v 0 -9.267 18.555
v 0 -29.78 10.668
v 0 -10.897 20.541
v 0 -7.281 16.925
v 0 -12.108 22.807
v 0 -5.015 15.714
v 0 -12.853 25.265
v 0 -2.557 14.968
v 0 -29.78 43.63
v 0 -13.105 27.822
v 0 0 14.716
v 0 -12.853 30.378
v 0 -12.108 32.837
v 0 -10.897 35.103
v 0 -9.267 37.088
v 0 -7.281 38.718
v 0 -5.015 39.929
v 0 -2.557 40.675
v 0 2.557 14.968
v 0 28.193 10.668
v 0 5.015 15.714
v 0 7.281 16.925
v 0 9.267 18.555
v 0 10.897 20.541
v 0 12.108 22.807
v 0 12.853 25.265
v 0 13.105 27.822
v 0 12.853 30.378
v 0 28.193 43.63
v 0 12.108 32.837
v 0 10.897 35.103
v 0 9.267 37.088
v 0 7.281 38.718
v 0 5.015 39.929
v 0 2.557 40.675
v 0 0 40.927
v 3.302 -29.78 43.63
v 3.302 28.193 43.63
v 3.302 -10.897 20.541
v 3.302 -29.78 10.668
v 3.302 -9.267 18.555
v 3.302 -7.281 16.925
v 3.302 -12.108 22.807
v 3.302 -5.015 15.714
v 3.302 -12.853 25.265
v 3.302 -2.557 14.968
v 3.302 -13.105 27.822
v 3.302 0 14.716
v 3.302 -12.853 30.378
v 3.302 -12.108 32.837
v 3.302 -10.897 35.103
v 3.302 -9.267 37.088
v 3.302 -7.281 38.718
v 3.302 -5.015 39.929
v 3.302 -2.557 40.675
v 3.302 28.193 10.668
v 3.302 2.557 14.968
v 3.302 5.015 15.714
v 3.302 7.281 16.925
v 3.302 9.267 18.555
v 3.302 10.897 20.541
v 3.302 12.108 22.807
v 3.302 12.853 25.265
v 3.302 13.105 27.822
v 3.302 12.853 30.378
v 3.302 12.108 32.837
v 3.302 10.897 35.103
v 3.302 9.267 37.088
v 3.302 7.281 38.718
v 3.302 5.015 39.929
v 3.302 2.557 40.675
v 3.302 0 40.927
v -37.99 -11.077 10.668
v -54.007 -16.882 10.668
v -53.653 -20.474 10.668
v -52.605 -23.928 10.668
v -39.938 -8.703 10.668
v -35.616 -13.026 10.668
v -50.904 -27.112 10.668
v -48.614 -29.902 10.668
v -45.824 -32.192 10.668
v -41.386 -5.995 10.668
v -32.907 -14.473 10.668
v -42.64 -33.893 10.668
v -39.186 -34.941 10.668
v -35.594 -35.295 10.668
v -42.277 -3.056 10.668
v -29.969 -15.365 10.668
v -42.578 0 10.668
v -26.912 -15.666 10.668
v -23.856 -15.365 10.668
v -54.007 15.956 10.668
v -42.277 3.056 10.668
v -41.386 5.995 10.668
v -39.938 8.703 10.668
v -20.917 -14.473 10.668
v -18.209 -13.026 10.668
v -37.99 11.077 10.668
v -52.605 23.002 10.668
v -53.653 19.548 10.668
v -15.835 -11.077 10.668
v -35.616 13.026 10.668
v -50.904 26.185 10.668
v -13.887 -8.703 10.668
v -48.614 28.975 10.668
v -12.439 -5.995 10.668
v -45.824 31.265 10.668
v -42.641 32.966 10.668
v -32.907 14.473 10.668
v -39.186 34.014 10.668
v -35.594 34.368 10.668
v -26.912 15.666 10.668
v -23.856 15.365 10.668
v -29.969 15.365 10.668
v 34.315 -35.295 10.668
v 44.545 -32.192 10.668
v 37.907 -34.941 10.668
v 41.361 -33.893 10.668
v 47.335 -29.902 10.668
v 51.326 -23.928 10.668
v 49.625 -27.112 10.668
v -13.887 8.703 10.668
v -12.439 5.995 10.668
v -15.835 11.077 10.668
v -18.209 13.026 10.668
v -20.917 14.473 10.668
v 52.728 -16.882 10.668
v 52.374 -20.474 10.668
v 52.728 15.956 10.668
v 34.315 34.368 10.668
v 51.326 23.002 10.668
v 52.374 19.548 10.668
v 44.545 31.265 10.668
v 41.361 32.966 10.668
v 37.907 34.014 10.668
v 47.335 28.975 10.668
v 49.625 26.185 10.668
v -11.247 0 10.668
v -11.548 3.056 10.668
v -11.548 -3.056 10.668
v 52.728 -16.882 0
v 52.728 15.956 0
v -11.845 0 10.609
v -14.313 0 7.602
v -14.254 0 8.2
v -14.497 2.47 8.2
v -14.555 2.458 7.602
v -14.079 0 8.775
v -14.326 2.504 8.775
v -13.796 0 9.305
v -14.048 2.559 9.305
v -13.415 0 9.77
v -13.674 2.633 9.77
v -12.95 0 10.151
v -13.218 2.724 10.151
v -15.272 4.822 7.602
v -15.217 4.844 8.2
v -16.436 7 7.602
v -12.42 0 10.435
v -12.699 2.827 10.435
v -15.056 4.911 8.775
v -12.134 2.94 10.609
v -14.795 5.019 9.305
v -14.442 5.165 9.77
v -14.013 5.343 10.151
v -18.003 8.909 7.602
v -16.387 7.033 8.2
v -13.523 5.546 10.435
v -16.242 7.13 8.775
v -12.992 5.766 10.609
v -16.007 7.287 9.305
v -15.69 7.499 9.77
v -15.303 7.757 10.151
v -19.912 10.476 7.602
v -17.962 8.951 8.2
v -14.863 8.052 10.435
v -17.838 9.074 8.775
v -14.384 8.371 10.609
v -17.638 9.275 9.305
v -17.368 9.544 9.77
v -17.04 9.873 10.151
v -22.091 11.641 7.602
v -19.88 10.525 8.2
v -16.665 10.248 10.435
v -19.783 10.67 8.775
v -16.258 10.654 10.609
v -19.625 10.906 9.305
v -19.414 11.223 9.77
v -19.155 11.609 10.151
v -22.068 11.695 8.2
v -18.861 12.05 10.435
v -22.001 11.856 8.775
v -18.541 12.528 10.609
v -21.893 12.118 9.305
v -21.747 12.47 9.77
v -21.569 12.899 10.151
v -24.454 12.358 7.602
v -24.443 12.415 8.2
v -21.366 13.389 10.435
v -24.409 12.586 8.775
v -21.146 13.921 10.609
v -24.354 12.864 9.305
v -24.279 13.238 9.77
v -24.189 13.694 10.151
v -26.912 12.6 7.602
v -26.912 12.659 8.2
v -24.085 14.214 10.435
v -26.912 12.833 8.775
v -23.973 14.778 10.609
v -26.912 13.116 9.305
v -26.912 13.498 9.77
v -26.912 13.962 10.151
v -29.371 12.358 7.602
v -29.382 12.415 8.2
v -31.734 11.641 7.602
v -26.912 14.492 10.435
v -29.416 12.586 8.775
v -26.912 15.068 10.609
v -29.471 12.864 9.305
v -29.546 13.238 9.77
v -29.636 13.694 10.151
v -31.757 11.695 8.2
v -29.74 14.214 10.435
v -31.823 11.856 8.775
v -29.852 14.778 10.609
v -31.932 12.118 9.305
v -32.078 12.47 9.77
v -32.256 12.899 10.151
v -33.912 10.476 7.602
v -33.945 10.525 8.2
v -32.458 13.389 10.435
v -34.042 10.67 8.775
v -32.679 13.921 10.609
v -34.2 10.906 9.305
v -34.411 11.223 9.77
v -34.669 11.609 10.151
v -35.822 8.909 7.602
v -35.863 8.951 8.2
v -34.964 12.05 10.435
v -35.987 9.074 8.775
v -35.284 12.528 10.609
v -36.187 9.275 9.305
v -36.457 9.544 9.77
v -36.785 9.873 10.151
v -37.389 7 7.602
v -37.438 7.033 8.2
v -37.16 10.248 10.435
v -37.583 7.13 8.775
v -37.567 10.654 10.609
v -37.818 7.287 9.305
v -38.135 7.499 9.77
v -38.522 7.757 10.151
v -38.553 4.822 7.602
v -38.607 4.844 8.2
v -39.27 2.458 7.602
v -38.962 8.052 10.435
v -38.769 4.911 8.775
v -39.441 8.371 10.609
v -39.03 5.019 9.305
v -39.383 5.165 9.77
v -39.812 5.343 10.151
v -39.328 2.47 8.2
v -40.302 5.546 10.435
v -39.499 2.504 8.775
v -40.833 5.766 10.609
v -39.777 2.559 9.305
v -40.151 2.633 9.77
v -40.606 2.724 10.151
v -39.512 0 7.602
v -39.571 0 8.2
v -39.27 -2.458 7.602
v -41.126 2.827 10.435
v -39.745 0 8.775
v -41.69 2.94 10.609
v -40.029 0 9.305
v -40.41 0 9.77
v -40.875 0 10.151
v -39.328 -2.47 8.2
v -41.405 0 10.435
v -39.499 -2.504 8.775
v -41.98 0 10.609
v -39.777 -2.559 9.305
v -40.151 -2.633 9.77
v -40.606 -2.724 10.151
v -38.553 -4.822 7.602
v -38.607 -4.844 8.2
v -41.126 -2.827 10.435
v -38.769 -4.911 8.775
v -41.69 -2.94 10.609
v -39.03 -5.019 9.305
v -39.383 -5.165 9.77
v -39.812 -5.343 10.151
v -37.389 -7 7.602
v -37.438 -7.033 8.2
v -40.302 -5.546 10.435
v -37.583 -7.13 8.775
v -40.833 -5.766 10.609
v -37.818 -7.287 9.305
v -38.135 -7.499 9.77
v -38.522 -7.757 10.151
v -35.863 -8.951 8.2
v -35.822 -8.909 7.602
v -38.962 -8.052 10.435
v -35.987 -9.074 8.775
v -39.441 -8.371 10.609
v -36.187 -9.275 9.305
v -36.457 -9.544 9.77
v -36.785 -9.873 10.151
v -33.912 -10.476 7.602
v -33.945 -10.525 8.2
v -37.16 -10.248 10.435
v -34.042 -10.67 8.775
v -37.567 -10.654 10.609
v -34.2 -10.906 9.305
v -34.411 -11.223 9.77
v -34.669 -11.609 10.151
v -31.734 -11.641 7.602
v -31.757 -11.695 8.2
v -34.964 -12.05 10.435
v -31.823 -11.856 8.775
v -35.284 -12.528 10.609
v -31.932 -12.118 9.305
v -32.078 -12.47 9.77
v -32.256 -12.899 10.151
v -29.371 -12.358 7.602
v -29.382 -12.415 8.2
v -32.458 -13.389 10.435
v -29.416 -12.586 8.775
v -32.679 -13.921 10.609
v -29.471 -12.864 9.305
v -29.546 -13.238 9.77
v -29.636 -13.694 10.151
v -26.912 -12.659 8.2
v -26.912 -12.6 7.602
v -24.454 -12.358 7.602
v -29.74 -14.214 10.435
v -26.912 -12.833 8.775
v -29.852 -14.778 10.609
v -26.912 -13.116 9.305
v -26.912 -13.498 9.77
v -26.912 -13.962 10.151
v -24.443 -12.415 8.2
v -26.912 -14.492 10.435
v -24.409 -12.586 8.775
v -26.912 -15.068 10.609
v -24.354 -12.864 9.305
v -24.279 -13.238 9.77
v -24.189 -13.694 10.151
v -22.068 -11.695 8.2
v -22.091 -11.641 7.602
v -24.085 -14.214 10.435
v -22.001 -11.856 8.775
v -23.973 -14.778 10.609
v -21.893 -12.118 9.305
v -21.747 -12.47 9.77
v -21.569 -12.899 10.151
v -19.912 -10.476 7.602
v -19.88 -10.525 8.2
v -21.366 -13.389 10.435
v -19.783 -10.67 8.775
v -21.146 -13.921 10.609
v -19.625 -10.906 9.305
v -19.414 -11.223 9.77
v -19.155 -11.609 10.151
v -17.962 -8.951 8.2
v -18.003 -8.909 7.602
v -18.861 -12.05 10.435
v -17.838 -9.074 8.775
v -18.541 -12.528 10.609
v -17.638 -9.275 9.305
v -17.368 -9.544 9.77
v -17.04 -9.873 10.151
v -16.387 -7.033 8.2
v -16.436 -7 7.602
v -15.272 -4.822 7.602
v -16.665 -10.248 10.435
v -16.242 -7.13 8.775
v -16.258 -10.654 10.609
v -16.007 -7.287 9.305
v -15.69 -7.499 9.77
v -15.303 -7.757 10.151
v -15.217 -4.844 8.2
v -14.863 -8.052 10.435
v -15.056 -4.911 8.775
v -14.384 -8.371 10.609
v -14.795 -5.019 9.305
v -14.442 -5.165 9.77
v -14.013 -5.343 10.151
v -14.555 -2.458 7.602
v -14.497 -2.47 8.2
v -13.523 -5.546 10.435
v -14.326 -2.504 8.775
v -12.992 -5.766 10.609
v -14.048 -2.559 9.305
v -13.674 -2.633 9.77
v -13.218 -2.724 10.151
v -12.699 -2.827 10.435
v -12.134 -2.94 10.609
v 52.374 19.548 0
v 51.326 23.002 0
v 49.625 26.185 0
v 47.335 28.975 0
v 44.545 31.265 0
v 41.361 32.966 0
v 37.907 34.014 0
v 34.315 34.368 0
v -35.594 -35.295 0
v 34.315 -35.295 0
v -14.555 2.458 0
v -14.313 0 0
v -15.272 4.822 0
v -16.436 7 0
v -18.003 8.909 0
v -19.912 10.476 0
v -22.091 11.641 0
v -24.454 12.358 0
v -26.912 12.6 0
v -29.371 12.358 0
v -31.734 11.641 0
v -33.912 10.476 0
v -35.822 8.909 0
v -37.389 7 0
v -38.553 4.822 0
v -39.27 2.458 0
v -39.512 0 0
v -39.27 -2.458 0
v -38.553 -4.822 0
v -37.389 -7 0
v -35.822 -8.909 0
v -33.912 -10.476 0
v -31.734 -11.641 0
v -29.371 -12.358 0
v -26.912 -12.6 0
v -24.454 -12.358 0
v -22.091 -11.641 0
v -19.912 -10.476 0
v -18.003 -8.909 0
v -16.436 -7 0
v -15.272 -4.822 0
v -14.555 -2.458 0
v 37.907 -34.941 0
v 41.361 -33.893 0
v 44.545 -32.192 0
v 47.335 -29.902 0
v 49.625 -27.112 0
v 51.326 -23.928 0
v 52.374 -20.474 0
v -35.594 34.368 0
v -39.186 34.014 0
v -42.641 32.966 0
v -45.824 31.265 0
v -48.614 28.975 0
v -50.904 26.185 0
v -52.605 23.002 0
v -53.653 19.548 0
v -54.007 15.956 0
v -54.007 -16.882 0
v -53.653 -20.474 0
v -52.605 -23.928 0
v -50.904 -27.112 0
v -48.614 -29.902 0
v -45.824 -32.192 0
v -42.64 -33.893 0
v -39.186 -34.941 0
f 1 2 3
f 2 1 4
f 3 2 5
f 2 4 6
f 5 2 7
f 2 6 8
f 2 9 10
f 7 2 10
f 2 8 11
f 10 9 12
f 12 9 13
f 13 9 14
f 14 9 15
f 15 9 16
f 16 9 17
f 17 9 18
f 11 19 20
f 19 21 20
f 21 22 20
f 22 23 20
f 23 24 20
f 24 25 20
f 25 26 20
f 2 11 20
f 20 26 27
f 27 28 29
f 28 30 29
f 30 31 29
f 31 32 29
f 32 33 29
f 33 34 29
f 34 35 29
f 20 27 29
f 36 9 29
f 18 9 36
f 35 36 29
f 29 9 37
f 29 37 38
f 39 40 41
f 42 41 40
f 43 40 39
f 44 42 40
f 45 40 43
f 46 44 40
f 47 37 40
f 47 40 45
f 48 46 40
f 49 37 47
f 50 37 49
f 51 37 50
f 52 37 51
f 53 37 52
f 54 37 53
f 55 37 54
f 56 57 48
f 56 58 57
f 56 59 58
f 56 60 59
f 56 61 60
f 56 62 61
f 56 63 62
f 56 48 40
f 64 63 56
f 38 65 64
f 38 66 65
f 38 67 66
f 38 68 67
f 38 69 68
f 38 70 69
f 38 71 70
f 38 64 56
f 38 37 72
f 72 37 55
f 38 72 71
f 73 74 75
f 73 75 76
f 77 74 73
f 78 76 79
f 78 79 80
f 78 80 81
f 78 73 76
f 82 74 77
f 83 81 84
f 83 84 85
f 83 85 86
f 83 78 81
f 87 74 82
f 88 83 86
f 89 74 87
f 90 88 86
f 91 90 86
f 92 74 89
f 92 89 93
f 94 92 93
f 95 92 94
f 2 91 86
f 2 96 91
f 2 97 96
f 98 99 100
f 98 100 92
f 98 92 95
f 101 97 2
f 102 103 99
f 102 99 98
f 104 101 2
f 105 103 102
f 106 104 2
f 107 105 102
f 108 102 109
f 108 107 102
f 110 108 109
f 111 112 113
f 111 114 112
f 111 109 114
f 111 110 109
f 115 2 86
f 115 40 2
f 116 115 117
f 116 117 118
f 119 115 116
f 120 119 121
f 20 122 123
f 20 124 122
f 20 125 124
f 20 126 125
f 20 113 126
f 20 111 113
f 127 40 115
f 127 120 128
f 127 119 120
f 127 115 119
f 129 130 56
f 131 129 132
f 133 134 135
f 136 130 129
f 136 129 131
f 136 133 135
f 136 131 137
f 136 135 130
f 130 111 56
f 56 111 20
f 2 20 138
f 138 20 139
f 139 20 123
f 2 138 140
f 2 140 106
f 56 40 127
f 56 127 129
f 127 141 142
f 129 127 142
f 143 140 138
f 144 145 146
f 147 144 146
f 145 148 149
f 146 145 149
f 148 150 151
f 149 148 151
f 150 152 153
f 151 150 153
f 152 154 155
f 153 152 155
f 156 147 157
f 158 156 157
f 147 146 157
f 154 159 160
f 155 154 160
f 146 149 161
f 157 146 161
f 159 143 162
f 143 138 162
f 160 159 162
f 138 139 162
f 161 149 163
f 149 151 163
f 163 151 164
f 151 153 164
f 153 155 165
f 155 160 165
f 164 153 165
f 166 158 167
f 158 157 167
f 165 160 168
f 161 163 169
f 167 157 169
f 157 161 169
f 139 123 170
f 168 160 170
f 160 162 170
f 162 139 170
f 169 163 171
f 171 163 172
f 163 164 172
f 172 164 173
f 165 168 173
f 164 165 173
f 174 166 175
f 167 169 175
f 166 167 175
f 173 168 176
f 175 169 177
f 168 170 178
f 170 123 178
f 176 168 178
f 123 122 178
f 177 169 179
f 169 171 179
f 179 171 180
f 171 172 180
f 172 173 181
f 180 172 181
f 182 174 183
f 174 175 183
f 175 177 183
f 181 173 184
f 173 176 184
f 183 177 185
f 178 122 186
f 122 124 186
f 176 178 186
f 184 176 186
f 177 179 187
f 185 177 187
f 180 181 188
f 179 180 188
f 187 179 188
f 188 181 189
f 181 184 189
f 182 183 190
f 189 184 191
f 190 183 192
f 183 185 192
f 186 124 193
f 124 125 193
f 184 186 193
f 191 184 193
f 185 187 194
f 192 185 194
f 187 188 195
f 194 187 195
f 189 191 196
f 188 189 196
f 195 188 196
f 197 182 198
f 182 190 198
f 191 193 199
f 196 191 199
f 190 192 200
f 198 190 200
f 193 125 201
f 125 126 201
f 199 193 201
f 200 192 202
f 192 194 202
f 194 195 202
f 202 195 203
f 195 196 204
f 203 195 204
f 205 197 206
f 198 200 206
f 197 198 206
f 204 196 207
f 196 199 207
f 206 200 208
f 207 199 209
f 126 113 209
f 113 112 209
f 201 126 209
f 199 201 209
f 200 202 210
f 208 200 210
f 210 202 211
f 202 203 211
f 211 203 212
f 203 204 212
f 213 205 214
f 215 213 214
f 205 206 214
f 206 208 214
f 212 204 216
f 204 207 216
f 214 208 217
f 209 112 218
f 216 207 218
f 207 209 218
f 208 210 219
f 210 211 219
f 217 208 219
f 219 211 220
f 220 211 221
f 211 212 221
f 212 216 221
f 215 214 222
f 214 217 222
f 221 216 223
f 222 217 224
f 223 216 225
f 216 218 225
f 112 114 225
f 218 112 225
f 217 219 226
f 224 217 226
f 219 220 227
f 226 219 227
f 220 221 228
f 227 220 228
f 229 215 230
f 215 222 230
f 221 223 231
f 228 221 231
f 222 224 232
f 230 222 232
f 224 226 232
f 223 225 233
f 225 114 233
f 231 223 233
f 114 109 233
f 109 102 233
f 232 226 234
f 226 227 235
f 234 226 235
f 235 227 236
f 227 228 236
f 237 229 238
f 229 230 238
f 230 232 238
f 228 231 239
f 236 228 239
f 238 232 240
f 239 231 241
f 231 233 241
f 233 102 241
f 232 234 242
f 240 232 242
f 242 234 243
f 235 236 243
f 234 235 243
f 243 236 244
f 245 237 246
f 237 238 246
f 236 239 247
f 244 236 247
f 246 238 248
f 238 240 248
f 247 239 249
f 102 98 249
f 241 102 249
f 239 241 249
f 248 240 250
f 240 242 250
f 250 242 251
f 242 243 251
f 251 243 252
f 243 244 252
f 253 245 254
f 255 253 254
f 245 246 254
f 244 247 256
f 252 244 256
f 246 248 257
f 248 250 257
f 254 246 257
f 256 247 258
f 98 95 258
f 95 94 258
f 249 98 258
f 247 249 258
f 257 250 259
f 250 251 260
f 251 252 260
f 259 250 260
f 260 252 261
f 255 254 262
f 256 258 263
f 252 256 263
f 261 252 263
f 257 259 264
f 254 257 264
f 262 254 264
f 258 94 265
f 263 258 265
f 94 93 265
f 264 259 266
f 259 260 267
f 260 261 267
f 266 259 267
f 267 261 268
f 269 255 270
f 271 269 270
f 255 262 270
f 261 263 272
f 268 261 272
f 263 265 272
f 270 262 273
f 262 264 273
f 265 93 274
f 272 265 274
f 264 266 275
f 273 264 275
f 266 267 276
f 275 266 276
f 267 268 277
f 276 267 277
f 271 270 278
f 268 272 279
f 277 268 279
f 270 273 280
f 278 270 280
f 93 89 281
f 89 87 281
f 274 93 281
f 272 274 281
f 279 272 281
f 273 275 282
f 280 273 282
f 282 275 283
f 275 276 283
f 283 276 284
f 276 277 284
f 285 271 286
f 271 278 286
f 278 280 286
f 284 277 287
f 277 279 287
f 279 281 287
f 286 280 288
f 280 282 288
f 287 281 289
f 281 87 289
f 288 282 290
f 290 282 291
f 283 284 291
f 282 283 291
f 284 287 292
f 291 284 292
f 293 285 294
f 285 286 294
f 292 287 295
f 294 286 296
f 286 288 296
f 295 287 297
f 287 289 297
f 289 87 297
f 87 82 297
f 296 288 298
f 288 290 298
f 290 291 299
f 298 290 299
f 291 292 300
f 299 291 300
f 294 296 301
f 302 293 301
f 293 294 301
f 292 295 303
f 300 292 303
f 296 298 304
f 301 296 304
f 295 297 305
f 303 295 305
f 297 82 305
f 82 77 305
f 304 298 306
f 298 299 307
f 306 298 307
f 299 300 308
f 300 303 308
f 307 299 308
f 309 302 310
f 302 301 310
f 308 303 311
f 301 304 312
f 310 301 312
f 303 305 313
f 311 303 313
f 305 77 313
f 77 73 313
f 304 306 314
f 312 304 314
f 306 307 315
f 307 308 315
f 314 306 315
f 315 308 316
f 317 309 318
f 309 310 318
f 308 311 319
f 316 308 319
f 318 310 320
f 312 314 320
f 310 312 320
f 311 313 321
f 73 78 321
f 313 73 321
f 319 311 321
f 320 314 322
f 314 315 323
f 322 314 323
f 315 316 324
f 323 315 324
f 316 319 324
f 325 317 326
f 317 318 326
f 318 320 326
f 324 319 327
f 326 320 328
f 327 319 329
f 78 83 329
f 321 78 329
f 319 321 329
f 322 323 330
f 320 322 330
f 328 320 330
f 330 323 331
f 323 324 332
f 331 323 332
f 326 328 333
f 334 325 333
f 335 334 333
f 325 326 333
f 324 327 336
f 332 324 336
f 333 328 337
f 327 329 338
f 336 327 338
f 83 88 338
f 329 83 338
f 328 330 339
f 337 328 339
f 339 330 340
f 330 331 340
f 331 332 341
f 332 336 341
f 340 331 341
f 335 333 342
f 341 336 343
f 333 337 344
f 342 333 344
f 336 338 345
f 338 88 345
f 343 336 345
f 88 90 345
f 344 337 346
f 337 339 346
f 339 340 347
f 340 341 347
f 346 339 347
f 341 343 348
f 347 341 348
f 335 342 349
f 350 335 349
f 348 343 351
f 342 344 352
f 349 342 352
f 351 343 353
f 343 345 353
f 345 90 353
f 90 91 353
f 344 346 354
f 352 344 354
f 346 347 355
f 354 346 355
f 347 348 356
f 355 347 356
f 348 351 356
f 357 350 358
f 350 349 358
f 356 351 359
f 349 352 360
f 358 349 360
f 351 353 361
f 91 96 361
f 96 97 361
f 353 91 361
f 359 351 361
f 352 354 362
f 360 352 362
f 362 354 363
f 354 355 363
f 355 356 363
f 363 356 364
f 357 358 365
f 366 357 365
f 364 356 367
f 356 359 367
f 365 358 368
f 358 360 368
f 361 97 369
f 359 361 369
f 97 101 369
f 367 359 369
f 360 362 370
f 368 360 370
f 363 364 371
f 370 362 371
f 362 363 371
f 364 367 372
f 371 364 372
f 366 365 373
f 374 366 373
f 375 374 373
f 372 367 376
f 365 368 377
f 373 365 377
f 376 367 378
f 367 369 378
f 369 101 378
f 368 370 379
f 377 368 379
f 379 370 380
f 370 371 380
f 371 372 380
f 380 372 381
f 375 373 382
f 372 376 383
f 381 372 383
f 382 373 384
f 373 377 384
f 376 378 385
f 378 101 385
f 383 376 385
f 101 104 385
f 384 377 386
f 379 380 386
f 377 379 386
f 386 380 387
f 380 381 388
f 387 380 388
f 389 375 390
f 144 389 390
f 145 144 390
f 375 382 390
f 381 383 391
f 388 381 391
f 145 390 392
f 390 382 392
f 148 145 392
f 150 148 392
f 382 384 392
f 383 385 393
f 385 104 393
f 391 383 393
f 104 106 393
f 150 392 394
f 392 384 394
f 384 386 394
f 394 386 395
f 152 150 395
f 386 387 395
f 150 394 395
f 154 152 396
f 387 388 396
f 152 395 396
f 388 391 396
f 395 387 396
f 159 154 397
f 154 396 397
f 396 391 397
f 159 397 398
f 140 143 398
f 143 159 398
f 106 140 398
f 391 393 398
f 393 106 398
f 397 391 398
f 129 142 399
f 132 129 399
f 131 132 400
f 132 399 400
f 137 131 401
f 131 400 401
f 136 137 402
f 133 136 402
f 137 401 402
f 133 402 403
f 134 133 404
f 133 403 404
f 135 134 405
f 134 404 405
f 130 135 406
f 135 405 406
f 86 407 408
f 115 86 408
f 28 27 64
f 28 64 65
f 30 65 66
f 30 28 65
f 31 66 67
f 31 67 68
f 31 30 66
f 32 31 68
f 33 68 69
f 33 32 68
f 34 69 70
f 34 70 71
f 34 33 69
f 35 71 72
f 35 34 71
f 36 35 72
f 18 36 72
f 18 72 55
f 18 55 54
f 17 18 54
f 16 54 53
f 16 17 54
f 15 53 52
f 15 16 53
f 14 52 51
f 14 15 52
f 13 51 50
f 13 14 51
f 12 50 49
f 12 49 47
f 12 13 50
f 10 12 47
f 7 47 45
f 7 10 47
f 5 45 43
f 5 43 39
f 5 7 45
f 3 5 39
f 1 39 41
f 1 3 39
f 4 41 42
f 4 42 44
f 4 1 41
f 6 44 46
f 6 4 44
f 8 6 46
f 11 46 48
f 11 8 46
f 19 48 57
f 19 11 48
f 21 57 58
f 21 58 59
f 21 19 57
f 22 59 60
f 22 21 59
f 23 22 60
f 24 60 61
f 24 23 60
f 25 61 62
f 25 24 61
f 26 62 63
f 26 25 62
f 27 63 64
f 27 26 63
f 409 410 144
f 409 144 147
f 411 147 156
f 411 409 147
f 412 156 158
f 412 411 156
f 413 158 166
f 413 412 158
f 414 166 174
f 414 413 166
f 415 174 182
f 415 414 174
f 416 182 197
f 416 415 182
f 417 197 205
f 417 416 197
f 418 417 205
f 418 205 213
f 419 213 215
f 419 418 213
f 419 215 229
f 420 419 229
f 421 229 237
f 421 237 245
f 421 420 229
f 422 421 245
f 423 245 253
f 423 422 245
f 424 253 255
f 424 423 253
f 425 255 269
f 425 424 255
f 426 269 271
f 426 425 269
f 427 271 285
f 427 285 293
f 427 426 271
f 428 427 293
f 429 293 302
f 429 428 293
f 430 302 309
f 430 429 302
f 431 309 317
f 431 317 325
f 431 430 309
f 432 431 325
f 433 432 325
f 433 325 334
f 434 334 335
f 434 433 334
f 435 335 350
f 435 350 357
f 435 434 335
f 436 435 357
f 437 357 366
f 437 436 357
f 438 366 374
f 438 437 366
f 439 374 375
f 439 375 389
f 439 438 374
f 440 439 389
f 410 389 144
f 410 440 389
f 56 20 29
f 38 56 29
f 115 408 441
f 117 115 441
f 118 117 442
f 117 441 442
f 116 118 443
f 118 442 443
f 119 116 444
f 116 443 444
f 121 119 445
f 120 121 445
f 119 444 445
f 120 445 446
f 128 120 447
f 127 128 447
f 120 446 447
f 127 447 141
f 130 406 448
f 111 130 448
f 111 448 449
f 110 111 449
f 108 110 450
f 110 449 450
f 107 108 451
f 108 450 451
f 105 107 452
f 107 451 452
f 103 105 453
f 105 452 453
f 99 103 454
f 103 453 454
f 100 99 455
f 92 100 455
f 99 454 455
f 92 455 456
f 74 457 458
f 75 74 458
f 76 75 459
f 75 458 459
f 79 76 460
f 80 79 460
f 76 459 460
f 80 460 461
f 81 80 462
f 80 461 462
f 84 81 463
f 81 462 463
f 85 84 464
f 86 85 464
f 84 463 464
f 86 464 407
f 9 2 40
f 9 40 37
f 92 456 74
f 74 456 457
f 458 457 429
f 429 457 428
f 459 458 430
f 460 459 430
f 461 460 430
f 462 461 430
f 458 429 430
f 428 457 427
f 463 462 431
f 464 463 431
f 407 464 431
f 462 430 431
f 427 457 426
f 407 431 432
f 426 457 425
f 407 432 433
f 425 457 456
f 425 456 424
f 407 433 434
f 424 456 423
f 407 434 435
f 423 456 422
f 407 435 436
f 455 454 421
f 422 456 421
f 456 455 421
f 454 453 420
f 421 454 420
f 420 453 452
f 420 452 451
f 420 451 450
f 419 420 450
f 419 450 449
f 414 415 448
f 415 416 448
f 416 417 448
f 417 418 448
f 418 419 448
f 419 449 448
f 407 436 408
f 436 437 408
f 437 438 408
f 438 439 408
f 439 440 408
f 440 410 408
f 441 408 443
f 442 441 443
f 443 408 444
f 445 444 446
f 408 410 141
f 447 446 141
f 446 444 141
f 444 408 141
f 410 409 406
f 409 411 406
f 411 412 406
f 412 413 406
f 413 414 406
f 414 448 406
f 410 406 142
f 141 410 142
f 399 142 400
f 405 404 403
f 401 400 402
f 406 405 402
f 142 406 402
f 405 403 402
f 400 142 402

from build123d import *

# Parameters (mm, degrees)
F0_R     = 12.59962
F1_DEPTH = 10.668
F2_R     = 3.066051
F3_W     = 57.973618
F3_H     = 34.38655
F3_R     = 13.105167
F4_DEPTH = 3.302


with BuildPart() as f1:
    # F0 (on Top) → F1 (new body)
    with BuildSketch(Plane.XY):
        with BuildLine():
            Line((34.315242, 34.36793), (-35.594401, 34.36793))
            ThreePointArc((-35.594401, 34.36793), (-48.613899, 28.975077), (-54.006752, 15.955579))
            Line((-54.006752, 15.955579), (-54.006752, -16.882243))
            ThreePointArc((-54.006752, -16.882243), (-48.613897, -29.901747), (-35.594393, -35.294602))
            Line((-35.594393, -35.294602), (34.315242, -35.294602))
            ThreePointArc((34.315242, -35.294602), (47.334745, -29.901747), (52.7276, -16.882243))
            Line((52.7276, -16.882243), (52.7276, 15.955572))
            ThreePointArc((52.7276, 15.955572), (47.334745, 28.975075), (34.315242, 34.36793))
        make_face()
        with Locations((-26.912455, 0)):
            Circle(F0_R, mode=Mode.SUBTRACT)
    extrude(amount=F1_DEPTH)

    # F2
    f2_edges = [f1.edges().sort_by_distance(p)[0] for p in [
        (-39.512074, 0, 10.668),
    ]]
    fillet(f2_edges, radius=F2_R)

    # F3 (on Right) → F4 (join)
    with BuildSketch(Plane.YZ):
        with Locations((-0.793372, 26.436993)):
            Rectangle(F3_W, F3_H)
        with Locations((0, 27.82166)):
            Circle(F3_R, mode=Mode.SUBTRACT)
    extrude(amount=F4_DEPTH)


solid = f1.part
